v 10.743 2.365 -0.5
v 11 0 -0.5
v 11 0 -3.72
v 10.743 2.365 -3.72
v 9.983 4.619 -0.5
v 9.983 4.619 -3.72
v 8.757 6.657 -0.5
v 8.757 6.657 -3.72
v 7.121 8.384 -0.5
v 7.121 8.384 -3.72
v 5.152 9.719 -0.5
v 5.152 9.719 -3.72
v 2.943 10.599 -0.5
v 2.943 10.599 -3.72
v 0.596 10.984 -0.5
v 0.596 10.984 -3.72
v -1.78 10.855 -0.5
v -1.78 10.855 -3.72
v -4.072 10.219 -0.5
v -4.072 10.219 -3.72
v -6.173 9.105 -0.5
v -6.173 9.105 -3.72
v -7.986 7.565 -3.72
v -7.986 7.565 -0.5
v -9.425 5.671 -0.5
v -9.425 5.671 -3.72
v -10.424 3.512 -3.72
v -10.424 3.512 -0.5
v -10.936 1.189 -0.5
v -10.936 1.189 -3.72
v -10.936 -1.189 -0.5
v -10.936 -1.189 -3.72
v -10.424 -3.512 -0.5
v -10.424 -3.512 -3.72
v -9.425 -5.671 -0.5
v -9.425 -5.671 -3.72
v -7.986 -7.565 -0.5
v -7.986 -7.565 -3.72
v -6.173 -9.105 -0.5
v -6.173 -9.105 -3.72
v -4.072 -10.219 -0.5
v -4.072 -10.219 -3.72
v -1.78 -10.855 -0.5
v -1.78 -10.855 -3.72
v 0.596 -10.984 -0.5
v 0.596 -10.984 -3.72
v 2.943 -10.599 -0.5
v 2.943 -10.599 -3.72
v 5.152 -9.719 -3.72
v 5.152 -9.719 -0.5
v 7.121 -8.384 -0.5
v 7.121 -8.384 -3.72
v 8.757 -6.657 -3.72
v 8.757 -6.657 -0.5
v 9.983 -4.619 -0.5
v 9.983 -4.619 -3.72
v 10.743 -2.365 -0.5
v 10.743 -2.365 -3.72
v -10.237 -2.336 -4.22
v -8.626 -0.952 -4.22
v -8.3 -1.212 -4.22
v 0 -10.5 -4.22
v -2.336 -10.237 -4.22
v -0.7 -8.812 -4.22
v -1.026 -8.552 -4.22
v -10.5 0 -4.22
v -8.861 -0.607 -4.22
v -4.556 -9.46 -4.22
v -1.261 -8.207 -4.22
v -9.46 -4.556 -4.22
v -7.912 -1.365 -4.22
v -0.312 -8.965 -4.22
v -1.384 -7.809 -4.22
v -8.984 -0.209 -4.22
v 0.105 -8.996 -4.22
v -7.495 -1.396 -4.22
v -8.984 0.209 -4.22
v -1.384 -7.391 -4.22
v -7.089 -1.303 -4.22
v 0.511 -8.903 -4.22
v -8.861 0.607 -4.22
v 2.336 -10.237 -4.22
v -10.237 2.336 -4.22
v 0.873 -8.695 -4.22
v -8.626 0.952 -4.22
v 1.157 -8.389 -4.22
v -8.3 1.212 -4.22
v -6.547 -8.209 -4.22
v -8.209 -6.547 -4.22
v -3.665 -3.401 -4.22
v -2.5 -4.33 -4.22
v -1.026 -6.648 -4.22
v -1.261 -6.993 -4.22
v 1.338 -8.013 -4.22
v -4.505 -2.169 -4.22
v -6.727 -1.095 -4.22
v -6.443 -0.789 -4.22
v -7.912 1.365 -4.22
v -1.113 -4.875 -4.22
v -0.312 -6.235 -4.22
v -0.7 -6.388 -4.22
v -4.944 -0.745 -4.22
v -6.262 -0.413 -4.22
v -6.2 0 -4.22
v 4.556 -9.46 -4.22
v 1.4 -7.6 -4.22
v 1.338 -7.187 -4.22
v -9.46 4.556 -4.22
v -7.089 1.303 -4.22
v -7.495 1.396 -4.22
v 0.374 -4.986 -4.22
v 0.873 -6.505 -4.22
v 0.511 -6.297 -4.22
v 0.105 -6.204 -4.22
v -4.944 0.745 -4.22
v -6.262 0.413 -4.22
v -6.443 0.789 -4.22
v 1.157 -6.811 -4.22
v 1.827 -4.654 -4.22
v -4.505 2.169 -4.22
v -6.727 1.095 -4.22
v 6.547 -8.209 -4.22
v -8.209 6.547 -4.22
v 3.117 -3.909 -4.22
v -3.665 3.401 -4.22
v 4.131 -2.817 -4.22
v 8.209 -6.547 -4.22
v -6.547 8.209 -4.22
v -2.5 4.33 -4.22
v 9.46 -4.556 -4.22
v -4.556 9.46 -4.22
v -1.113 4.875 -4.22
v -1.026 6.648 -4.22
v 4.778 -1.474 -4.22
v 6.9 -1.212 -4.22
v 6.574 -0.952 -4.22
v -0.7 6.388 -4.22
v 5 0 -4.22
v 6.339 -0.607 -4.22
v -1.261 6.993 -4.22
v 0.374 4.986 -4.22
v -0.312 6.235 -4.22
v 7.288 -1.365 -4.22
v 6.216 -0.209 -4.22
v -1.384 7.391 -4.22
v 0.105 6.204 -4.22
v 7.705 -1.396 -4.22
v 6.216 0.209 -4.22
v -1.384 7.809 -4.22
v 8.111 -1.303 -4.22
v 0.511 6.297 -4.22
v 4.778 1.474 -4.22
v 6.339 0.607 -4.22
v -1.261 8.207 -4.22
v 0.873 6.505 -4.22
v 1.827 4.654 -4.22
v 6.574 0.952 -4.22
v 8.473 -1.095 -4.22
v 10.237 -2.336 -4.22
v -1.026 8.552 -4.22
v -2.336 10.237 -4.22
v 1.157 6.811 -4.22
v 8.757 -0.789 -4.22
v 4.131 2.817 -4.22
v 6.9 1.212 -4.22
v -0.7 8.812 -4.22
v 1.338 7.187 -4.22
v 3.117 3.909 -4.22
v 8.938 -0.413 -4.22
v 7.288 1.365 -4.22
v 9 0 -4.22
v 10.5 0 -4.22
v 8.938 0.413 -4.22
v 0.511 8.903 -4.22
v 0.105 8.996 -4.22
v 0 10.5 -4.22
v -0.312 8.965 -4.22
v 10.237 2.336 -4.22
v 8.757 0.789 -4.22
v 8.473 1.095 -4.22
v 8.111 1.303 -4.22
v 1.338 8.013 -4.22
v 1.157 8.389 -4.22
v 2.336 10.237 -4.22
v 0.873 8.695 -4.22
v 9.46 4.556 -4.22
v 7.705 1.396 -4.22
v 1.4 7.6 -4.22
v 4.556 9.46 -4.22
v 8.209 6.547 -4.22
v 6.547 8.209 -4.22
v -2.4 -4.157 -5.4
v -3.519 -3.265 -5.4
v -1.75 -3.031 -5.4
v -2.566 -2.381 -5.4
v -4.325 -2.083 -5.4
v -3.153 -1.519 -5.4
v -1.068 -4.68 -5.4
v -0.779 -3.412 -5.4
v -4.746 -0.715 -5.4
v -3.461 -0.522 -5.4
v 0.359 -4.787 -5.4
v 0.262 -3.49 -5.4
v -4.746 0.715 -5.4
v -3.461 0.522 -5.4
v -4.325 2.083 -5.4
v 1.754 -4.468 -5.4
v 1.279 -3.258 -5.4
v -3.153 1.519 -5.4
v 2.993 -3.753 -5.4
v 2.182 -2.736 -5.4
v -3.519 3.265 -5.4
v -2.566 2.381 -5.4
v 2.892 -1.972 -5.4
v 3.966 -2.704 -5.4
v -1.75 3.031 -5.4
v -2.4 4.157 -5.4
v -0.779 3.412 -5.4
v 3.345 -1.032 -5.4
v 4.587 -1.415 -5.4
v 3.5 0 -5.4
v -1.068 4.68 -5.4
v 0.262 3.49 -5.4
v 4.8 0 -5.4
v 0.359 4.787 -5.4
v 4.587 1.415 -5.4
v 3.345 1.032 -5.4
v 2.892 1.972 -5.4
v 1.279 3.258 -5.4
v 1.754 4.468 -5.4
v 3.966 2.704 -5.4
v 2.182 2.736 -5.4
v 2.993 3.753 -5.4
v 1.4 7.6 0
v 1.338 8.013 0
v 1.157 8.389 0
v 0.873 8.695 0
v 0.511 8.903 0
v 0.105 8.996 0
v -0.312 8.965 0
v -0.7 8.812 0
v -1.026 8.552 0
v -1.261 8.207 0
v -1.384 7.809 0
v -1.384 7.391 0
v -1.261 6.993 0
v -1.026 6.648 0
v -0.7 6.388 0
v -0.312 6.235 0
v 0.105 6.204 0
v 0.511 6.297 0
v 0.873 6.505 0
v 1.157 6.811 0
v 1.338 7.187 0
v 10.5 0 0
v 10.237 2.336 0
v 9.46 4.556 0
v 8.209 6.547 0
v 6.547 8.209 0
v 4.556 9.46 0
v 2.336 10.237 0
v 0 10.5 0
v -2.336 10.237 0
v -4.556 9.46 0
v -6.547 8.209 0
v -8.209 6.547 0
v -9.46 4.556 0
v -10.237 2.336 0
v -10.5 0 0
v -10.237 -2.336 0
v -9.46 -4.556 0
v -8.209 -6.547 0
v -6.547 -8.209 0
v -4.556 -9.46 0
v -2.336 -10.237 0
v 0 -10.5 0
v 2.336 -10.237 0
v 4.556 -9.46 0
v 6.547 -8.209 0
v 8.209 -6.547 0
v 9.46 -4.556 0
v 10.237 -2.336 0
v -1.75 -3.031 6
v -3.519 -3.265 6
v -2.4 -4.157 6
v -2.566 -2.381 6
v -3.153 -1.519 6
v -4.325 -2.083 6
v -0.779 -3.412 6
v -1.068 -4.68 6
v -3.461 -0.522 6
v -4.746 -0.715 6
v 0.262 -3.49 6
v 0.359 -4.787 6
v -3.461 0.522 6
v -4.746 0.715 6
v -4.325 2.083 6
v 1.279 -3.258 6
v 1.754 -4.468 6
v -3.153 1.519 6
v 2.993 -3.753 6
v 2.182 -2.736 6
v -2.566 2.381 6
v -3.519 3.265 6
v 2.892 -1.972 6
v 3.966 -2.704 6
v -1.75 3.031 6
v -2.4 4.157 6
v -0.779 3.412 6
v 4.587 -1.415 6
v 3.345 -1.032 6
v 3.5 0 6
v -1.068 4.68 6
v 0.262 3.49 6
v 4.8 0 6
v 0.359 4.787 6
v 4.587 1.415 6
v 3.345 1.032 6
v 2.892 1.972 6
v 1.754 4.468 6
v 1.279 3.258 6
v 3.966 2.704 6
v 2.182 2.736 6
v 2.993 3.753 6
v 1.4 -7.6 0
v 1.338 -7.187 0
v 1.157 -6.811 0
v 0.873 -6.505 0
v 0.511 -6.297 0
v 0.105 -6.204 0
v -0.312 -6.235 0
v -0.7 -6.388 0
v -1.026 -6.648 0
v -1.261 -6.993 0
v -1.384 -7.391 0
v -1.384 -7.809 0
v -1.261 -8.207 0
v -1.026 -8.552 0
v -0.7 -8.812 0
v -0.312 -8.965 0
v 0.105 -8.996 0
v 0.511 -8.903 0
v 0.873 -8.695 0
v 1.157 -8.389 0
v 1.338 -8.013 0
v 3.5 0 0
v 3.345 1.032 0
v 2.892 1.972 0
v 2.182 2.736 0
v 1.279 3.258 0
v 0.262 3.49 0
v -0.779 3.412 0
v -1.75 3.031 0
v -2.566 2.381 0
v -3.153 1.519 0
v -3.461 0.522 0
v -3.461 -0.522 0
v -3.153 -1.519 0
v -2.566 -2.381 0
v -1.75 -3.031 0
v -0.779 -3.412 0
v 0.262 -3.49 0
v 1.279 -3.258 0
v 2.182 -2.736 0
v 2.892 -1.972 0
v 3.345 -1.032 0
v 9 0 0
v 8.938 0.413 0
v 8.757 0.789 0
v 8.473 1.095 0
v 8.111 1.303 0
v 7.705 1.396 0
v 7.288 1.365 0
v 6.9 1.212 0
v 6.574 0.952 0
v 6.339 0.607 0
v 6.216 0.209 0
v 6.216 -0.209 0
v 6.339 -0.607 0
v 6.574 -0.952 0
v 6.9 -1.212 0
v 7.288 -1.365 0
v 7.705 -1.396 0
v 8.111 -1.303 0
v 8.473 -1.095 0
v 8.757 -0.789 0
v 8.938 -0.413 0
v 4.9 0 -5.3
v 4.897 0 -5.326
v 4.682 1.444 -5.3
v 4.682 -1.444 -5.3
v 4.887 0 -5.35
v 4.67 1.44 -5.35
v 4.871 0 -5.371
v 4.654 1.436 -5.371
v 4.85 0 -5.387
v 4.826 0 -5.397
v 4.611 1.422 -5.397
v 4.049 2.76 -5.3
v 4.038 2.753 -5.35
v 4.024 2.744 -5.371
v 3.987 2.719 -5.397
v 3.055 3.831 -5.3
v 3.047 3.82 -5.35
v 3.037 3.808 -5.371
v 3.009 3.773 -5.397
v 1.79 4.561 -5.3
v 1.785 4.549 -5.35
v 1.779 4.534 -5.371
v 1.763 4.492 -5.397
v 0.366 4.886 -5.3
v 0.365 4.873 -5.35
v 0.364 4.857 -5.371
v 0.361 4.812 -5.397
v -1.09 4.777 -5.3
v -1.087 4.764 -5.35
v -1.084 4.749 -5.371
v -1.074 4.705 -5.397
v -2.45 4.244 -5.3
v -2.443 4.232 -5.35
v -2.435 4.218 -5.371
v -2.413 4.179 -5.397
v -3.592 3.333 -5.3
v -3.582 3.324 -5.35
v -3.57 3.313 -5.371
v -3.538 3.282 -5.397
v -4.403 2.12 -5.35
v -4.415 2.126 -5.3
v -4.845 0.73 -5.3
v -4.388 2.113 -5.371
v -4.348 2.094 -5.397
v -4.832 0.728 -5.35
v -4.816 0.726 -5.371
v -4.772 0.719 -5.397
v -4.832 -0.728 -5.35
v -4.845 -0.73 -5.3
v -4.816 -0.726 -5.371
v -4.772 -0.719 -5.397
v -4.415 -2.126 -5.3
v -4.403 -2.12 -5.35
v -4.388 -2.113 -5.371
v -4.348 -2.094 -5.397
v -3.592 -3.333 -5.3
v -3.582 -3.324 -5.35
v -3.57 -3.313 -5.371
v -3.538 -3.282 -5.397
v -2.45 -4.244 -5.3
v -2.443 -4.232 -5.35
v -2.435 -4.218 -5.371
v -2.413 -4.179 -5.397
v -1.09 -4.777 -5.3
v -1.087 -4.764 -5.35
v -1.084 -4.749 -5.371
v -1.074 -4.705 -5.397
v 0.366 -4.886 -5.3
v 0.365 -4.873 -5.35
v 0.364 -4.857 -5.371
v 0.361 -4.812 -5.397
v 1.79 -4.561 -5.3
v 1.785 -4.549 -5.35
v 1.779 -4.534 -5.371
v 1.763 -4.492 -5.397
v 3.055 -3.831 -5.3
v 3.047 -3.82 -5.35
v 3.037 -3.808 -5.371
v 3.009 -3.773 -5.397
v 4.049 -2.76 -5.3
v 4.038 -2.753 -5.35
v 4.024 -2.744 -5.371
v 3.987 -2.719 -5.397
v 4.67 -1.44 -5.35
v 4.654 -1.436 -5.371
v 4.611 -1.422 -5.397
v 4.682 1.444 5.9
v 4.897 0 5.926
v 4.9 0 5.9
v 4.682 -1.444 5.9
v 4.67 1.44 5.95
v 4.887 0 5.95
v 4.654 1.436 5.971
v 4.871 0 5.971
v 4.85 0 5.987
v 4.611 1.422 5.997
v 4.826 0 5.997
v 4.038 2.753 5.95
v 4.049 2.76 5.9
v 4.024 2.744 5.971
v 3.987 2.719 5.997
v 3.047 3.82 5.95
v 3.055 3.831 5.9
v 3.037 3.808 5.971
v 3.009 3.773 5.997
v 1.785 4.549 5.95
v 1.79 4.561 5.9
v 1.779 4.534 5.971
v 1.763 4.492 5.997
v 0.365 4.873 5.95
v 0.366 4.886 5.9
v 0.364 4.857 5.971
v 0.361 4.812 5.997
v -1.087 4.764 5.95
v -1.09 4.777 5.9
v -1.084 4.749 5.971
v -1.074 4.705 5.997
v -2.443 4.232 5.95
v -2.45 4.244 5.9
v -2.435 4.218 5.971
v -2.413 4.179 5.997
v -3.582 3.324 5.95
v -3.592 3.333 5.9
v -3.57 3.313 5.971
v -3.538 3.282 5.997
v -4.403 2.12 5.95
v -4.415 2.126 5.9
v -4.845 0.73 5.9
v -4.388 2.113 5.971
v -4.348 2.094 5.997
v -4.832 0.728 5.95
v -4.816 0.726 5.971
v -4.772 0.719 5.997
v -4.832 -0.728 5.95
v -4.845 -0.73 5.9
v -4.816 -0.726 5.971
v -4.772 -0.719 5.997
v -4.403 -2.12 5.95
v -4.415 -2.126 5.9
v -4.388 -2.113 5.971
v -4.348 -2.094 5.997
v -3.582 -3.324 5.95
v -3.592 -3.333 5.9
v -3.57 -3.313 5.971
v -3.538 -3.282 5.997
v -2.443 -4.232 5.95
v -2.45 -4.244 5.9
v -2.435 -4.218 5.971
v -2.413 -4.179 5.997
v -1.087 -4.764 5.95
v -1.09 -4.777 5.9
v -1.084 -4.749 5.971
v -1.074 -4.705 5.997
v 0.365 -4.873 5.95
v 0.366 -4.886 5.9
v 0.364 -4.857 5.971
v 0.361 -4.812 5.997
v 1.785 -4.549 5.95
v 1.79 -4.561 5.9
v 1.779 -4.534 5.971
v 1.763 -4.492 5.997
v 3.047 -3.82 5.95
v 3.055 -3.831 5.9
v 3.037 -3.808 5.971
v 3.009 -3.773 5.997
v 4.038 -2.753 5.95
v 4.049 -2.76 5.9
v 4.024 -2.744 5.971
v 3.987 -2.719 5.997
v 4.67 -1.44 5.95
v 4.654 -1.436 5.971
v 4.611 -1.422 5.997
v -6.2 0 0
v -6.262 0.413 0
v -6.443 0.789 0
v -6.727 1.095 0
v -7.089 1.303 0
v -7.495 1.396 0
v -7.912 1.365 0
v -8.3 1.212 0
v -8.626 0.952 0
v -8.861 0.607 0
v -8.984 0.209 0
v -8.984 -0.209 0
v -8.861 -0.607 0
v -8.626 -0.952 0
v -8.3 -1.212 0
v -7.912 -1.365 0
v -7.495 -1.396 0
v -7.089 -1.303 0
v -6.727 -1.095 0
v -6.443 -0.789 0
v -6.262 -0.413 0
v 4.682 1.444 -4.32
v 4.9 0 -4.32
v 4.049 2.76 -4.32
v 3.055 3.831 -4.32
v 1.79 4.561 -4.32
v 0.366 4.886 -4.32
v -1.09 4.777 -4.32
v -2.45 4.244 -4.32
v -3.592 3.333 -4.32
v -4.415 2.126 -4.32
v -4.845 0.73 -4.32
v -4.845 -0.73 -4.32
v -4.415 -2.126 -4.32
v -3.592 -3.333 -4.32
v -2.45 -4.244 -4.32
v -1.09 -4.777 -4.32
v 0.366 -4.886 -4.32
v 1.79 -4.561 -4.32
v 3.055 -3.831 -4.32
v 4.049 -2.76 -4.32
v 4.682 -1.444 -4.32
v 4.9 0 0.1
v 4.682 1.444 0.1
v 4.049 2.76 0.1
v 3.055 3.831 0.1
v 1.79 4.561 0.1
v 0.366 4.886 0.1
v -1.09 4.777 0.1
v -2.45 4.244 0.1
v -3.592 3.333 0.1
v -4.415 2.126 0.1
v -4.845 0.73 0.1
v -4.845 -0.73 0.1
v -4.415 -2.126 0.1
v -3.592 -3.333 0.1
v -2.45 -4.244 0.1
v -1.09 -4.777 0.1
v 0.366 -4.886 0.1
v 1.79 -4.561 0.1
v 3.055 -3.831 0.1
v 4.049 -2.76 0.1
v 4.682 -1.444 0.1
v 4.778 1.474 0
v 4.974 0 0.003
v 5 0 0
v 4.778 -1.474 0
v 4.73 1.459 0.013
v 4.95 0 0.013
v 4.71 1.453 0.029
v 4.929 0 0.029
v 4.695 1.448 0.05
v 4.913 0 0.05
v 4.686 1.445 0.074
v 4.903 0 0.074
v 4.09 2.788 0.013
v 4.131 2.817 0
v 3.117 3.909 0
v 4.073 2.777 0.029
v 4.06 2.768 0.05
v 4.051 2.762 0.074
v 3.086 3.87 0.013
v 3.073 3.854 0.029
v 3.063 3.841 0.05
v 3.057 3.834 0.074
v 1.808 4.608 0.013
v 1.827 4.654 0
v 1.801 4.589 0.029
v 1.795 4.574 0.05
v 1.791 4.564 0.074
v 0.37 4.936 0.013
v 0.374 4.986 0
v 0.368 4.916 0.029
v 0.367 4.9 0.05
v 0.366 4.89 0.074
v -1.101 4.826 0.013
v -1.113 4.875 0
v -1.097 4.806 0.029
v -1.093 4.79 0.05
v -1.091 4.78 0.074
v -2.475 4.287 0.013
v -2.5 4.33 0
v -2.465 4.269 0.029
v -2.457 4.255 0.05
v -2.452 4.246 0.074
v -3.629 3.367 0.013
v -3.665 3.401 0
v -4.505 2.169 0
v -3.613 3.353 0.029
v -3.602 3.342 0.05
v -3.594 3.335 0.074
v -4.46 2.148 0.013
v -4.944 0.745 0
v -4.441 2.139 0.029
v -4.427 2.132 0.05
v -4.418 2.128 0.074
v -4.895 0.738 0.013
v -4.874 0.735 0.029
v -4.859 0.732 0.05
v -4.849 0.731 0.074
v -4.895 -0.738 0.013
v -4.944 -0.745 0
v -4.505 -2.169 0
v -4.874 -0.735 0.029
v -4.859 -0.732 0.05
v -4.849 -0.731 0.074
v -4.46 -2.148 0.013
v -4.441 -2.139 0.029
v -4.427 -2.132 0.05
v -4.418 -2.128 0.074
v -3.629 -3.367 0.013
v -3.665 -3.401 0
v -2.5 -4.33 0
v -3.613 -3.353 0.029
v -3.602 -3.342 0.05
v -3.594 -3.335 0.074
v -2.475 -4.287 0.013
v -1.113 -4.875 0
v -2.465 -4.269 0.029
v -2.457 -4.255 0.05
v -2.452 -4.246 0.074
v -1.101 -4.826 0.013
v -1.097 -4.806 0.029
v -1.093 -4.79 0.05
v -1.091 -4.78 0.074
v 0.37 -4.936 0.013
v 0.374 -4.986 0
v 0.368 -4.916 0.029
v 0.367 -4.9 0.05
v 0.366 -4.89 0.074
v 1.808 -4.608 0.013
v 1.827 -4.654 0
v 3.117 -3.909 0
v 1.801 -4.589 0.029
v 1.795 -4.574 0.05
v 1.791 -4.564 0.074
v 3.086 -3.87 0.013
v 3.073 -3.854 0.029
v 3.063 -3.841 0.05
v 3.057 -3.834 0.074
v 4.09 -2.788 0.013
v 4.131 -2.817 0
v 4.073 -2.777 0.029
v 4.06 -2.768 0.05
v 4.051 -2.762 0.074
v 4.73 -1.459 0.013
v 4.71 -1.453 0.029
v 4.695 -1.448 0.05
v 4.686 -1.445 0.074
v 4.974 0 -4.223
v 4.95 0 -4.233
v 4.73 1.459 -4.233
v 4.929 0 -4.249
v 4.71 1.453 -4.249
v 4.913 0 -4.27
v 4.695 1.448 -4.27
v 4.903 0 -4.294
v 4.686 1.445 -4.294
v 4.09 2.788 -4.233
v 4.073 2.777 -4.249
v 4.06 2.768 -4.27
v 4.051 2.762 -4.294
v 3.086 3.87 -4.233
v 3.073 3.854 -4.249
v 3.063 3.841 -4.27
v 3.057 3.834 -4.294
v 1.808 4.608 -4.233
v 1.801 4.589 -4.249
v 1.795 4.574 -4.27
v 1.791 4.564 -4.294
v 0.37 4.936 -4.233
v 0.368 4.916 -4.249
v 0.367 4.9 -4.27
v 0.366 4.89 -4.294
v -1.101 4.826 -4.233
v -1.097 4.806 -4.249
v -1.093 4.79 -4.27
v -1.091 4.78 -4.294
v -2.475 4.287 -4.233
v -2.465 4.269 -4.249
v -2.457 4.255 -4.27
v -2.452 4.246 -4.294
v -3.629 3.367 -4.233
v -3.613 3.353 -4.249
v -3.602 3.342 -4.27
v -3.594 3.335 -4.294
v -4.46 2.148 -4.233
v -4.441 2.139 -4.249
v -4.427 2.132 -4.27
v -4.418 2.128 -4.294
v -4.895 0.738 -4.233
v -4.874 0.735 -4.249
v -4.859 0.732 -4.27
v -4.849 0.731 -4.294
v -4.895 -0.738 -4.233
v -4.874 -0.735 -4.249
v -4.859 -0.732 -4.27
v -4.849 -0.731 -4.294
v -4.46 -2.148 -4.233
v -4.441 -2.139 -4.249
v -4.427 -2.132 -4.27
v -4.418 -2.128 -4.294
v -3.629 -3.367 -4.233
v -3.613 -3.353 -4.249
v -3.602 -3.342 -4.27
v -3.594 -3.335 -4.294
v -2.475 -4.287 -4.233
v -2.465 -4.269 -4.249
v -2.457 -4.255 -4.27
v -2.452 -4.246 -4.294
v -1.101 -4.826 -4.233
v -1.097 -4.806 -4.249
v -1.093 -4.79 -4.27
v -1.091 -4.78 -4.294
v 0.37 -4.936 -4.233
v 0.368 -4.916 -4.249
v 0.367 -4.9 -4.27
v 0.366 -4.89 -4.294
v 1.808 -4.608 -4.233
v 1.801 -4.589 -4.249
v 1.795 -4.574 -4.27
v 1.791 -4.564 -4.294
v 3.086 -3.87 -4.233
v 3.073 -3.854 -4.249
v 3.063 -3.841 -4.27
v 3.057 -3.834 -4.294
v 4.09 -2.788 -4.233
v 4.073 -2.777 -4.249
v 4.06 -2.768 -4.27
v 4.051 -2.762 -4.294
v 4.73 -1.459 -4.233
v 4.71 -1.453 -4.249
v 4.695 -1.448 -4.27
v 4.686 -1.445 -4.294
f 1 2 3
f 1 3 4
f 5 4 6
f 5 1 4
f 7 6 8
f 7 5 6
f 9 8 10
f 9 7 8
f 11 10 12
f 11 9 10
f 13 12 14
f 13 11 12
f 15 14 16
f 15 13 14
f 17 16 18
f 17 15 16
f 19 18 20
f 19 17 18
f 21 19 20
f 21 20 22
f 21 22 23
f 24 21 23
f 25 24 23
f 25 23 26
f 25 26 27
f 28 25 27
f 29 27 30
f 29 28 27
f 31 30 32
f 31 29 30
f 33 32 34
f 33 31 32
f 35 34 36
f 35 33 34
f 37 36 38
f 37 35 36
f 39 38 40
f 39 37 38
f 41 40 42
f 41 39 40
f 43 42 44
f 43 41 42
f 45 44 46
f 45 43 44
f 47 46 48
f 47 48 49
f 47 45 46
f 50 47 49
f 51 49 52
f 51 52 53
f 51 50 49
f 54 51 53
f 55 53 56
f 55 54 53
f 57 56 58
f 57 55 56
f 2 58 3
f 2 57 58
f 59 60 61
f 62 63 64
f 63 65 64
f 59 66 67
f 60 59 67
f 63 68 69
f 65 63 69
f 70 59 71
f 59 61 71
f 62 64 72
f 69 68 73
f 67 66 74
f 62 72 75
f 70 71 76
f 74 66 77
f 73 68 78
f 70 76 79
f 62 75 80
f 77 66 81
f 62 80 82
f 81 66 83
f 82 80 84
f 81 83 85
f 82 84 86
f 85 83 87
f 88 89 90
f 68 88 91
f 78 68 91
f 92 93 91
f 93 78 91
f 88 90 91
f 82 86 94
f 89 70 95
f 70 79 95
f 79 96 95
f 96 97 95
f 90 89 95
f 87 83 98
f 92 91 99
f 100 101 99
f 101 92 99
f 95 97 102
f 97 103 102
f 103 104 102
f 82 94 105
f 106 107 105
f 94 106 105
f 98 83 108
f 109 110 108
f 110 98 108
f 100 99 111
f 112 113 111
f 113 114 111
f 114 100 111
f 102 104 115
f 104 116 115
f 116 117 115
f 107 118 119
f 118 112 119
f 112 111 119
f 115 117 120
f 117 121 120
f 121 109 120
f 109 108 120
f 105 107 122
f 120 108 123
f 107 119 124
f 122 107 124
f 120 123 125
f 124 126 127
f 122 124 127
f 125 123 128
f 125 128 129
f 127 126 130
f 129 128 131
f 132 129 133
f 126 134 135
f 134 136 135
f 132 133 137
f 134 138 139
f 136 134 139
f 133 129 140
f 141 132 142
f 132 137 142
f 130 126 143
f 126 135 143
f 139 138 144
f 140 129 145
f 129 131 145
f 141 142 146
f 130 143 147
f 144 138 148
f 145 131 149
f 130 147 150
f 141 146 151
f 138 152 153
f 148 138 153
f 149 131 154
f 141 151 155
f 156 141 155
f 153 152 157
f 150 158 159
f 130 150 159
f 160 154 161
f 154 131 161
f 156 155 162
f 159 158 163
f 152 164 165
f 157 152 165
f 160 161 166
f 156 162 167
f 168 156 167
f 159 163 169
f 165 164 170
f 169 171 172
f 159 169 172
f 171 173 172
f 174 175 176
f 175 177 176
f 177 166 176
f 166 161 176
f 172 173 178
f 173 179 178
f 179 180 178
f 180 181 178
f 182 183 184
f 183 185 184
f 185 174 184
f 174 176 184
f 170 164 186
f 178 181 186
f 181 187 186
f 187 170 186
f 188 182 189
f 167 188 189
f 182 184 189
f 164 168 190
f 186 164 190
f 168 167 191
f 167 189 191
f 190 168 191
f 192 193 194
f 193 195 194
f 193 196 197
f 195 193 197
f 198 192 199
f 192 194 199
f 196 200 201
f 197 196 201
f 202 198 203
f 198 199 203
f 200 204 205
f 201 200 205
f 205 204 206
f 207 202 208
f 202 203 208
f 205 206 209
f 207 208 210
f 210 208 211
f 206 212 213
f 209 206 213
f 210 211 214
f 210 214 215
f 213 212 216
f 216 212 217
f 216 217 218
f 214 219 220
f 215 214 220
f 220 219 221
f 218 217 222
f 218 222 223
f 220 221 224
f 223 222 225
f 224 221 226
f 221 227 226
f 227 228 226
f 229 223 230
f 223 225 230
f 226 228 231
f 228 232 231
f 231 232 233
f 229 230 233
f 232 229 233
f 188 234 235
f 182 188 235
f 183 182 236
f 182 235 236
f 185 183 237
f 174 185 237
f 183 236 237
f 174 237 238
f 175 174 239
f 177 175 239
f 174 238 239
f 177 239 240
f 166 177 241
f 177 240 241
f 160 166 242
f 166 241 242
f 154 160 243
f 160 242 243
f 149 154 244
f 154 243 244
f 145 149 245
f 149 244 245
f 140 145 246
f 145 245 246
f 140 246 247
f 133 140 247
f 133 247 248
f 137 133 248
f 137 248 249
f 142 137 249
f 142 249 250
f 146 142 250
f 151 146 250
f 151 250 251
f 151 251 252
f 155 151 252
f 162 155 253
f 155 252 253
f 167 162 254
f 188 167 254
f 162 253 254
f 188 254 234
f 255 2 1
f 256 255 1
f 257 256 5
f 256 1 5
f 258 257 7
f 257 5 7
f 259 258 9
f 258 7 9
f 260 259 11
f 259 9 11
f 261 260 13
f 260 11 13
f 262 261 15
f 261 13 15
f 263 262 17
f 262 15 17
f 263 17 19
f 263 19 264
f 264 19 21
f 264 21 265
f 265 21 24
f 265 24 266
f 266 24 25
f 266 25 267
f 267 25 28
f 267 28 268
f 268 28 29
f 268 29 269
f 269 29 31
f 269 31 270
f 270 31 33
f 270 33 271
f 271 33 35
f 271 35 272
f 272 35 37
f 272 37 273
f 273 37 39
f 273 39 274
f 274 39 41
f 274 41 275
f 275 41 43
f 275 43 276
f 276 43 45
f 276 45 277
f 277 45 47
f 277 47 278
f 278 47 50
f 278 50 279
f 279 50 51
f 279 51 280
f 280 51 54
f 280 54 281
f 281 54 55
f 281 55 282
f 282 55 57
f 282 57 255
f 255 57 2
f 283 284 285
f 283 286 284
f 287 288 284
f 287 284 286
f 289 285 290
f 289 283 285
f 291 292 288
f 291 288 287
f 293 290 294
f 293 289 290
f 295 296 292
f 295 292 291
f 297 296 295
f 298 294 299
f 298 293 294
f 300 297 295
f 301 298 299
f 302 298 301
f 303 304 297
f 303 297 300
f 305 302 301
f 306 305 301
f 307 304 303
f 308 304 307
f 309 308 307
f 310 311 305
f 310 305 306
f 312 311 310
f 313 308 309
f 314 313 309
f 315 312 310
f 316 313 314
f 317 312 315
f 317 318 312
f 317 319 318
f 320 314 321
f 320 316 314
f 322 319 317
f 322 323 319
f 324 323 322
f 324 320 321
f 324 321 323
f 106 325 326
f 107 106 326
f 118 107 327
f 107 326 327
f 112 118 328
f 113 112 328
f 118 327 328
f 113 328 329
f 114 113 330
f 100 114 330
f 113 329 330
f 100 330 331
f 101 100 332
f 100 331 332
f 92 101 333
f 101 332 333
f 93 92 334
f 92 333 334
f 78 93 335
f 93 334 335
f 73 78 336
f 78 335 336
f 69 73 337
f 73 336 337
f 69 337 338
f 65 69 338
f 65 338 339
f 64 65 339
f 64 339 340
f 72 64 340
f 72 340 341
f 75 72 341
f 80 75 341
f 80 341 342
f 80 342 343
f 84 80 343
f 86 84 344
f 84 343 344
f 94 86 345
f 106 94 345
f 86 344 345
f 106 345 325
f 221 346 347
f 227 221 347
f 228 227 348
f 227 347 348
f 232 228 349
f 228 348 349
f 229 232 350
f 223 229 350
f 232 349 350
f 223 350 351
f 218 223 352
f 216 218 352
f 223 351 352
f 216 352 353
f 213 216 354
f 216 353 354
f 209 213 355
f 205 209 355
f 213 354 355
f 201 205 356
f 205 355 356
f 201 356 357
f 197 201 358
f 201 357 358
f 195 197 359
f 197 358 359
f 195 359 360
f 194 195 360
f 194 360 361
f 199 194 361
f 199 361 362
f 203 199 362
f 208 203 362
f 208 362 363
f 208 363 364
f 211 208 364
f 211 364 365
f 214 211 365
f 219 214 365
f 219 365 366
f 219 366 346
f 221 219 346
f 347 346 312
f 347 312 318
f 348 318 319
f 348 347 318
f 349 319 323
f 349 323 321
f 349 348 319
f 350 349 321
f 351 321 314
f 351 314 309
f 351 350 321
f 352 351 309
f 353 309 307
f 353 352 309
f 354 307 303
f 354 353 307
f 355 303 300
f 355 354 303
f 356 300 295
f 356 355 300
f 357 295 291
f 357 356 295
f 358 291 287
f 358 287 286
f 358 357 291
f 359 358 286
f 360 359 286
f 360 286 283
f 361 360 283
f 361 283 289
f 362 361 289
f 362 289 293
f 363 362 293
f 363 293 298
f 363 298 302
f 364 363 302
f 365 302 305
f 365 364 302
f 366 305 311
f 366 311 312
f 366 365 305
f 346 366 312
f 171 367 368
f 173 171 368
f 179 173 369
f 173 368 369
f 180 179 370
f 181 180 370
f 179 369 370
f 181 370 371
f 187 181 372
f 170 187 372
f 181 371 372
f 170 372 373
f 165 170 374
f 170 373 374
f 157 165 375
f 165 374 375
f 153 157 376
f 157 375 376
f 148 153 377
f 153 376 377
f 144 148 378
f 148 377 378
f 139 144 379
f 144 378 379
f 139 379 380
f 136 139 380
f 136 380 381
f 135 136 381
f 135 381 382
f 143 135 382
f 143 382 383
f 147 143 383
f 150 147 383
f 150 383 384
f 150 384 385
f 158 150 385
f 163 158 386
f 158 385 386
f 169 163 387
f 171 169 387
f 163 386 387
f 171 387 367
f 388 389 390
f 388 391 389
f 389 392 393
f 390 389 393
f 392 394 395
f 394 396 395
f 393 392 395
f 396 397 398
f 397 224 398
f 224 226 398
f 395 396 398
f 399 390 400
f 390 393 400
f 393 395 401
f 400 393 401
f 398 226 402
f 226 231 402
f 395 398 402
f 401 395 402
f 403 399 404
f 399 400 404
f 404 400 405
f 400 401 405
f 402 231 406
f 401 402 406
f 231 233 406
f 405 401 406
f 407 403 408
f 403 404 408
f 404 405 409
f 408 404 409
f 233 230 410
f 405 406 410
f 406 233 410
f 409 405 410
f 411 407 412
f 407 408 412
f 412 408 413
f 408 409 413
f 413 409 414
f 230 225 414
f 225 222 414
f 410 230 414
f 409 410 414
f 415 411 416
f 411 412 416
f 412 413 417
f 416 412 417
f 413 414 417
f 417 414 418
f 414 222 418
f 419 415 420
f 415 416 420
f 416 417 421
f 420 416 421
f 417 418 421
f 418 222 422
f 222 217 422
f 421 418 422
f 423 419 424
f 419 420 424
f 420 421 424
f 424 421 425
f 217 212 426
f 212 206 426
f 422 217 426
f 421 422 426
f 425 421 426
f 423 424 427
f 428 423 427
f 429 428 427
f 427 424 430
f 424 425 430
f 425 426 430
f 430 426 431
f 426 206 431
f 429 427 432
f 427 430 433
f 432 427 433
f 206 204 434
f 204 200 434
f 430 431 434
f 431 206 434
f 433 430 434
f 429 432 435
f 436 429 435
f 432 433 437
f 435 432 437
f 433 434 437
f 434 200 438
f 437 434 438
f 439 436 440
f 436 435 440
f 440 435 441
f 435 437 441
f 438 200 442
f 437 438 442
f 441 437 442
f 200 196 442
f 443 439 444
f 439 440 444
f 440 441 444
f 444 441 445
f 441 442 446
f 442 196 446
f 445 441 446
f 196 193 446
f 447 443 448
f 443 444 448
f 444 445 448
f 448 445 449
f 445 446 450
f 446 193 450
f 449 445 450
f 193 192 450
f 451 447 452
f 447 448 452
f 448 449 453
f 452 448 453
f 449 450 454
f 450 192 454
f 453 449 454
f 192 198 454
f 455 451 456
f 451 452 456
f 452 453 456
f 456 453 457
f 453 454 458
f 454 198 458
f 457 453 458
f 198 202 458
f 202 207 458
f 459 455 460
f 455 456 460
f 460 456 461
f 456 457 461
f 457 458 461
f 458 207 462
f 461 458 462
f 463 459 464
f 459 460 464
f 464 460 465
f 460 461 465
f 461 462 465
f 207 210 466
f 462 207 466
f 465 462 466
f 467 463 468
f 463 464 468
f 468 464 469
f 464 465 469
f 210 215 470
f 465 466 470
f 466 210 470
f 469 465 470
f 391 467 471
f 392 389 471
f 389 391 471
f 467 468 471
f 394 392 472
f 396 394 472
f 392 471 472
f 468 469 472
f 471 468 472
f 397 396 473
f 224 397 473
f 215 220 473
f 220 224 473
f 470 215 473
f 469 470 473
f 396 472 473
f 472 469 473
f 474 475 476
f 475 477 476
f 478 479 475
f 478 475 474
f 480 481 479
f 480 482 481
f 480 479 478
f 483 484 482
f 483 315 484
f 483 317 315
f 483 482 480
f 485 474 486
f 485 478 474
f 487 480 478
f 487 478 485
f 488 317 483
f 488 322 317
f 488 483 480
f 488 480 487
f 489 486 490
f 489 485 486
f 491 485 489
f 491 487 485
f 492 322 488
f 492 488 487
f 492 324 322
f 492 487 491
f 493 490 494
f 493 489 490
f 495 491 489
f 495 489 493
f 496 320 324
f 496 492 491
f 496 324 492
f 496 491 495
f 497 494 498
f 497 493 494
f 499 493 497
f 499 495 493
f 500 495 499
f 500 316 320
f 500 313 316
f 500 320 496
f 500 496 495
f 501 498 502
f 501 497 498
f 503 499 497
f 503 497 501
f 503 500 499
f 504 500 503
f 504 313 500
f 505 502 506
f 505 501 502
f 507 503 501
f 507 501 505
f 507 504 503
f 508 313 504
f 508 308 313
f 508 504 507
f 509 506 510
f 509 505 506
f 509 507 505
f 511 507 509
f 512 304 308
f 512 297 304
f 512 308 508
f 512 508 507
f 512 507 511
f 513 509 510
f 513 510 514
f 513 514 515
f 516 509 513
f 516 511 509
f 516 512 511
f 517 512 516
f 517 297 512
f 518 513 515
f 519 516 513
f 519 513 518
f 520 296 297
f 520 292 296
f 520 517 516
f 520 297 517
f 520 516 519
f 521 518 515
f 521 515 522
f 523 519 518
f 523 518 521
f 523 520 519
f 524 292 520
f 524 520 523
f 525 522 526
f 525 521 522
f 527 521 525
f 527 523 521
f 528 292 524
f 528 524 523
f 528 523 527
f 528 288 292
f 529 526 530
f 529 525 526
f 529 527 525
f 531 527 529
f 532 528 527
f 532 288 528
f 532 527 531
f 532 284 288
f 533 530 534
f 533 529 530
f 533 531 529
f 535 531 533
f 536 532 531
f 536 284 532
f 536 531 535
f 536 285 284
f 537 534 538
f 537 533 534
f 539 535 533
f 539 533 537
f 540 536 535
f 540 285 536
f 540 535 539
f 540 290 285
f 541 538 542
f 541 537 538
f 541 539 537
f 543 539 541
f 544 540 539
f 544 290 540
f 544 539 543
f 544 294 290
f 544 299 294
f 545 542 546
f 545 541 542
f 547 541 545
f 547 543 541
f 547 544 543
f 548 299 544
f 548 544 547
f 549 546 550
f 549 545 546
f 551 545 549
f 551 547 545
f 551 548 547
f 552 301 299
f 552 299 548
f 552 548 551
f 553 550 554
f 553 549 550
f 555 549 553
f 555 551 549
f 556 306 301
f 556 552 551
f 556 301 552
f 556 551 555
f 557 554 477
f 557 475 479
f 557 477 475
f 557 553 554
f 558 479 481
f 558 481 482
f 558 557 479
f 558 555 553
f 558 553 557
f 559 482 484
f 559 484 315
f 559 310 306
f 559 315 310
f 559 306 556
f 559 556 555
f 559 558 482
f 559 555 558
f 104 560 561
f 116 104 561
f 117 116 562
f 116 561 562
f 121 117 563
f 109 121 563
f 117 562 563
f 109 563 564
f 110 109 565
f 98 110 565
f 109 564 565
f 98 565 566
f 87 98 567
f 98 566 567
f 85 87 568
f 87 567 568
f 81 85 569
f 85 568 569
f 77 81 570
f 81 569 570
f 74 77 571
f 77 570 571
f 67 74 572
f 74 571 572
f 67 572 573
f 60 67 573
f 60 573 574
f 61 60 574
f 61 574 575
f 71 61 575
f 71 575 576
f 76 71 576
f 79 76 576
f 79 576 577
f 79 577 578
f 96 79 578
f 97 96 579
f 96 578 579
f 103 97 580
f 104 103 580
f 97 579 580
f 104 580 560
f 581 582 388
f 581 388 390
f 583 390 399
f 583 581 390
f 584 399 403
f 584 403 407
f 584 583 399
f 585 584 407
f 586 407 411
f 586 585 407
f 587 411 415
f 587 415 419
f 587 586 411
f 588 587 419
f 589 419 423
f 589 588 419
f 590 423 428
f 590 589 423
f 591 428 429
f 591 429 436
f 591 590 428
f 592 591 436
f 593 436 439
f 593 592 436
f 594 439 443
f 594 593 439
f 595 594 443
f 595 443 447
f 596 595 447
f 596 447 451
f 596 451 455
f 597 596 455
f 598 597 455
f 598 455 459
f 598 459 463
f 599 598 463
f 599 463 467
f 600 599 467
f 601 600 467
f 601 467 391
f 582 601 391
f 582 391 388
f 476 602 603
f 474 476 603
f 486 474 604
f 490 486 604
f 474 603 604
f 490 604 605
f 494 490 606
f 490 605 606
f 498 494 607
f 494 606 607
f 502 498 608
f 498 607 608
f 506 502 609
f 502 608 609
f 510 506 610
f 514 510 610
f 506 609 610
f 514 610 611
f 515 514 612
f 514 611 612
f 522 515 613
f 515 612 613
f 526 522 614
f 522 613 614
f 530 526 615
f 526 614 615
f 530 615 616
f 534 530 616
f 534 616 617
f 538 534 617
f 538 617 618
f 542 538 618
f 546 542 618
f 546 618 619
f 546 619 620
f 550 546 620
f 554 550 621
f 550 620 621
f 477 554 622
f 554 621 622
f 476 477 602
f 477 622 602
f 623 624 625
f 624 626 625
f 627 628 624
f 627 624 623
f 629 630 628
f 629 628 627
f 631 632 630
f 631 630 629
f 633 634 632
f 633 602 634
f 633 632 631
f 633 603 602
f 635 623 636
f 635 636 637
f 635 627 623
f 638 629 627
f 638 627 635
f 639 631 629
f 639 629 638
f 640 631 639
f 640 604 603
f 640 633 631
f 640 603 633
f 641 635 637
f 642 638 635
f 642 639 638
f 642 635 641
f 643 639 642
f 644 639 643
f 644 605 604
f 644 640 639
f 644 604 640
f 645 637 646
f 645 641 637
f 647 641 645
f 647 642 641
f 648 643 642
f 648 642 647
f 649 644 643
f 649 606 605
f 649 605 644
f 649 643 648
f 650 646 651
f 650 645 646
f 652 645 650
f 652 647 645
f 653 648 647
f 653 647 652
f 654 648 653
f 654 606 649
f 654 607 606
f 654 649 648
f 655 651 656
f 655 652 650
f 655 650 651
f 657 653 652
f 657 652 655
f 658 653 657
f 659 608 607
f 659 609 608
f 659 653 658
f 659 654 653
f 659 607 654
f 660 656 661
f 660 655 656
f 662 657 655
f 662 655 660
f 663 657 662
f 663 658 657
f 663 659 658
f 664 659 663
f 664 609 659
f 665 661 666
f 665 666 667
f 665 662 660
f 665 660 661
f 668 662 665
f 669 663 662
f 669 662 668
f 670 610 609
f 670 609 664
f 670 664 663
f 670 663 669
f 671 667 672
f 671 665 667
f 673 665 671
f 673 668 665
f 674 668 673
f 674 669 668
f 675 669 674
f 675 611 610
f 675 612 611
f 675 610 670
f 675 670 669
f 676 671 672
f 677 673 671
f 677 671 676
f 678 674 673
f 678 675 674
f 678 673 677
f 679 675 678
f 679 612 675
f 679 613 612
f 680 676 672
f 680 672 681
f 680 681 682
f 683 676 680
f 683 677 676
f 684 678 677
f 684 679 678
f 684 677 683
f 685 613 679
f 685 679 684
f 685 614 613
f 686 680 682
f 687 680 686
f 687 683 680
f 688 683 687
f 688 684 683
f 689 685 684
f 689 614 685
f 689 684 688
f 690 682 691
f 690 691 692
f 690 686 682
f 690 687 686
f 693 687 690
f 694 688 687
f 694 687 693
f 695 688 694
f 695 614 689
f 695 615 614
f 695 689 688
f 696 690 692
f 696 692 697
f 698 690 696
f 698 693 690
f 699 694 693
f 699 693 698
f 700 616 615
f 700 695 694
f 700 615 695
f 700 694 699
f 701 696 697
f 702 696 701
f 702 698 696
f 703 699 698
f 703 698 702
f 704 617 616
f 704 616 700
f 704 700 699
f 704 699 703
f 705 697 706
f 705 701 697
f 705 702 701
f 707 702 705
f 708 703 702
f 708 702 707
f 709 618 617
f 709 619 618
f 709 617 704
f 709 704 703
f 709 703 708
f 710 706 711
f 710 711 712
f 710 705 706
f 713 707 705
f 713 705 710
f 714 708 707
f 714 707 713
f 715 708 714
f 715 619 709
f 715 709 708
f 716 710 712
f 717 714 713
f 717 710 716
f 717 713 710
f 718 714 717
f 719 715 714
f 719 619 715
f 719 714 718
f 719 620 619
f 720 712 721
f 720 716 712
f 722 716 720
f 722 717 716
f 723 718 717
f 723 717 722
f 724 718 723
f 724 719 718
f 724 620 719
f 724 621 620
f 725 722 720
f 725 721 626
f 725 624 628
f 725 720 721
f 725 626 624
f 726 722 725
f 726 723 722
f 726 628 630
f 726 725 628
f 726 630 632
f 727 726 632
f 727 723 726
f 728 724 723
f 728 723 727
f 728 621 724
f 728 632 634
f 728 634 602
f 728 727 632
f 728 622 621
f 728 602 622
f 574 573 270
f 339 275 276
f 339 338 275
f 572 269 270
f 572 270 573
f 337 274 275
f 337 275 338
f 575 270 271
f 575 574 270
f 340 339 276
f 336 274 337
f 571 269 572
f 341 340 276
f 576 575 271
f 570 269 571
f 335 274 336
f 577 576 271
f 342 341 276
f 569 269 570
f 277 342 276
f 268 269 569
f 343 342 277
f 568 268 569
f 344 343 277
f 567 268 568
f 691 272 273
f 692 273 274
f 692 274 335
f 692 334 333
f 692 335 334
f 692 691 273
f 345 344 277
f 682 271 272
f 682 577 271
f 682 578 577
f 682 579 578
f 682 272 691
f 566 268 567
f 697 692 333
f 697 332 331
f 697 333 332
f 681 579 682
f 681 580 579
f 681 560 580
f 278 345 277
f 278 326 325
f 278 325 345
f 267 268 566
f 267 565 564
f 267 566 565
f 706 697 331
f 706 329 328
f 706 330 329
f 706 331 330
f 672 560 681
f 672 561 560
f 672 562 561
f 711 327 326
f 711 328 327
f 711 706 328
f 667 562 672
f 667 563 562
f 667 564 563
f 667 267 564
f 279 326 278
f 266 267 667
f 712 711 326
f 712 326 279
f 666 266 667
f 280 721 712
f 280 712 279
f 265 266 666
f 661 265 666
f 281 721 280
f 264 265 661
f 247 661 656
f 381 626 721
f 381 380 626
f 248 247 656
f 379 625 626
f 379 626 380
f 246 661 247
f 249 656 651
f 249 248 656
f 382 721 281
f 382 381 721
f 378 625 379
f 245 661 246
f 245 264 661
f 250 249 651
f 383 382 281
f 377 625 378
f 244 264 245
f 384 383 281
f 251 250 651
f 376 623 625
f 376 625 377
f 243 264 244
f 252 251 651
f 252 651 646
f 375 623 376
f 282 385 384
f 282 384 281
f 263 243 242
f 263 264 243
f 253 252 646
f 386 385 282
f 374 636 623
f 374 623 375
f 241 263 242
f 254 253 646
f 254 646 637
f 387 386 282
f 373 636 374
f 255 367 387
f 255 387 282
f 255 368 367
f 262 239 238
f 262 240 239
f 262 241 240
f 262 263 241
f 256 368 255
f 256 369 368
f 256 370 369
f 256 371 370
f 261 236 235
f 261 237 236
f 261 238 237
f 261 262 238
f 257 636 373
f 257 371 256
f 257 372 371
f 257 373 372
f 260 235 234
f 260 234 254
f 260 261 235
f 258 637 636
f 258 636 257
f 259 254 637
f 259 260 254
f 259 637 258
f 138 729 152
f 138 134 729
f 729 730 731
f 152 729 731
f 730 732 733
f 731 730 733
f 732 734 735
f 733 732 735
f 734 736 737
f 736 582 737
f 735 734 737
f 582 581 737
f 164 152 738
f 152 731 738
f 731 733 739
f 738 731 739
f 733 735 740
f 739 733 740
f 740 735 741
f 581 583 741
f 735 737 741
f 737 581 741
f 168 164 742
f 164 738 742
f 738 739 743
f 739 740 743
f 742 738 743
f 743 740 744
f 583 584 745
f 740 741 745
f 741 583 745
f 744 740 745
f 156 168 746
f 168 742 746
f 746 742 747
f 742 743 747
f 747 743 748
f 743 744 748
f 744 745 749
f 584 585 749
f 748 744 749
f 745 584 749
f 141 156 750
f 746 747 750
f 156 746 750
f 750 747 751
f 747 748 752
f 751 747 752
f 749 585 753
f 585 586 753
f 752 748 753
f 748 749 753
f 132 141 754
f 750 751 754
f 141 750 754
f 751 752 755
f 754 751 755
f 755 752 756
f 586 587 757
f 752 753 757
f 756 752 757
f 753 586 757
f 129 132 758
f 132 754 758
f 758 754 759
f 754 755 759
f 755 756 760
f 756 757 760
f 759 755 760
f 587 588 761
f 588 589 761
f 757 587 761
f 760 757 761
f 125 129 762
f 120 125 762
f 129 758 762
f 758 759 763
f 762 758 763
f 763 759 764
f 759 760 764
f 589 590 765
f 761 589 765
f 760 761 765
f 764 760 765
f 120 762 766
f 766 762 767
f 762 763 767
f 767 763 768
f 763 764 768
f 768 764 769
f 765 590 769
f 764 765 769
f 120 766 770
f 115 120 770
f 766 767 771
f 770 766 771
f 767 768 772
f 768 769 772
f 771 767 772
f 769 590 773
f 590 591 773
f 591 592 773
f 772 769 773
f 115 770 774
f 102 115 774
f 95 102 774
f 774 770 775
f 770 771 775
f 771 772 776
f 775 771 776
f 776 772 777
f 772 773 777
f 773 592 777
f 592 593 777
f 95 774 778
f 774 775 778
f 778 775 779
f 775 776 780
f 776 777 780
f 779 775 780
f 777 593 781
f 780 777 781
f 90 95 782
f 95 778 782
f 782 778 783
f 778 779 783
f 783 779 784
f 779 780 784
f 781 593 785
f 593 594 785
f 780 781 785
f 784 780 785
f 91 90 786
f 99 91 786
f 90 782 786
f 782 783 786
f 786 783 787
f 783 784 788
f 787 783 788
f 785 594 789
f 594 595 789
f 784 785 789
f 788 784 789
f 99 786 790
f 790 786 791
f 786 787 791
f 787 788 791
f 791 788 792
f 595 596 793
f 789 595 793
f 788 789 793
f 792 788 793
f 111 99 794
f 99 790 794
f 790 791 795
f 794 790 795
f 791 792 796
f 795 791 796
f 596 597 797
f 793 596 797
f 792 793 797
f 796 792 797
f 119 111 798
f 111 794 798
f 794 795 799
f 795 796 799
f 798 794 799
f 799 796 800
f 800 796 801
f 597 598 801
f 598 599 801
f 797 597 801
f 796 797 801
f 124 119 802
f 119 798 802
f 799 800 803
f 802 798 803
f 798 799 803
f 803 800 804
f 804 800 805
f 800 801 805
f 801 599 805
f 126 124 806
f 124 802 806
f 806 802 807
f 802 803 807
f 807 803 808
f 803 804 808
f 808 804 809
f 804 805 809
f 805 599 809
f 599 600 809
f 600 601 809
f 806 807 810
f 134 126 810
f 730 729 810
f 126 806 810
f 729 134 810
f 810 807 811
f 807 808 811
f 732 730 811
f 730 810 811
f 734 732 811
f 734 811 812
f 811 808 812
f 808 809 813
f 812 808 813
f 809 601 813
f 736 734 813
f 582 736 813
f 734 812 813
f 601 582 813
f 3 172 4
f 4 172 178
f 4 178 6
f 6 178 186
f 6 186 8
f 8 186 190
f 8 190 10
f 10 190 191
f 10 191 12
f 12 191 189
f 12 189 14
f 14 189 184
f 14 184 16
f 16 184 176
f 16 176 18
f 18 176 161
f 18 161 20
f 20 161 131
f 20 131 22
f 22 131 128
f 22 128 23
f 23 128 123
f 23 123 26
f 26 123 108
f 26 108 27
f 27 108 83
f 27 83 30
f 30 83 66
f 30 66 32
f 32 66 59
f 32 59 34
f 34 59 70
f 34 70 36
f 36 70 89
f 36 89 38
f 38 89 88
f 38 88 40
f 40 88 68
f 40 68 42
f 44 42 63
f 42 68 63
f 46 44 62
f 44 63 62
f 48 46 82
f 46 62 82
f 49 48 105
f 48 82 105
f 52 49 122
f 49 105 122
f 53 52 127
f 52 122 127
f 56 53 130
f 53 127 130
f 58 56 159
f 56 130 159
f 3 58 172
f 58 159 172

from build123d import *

# Parameters (mm, degrees)
F0_R          = 11
F0_R_2        = 1.4
F0_R_3        = 4.9
F0_R_4        = 3.5
F1_DEPTH      = 4.22
F2_DEPTH      = 5.4
F2_DEPTH_BACK = 6
F3_SIZE       = 0.5
F4_R          = 0.1


with BuildPart() as f1:
    # F0 (on Top) → F1 (new body)
    with BuildSketch(Plane.XY):
        Circle(F0_R)
        with Locations((0, -7.6)):
            Circle(F0_R_2, mode=Mode.SUBTRACT)
        with Locations((-7.6, 0)):
            Circle(F0_R_2, mode=Mode.SUBTRACT)
        Circle(F0_R_3, mode=Mode.SUBTRACT)
        with Locations((7.6, 0)):
            Circle(F0_R_2, mode=Mode.SUBTRACT)
        with Locations((0, 7.6)):
            Circle(F0_R_2, mode=Mode.SUBTRACT)
        Circle(F0_R_3)
        Circle(F0_R_4, mode=Mode.SUBTRACT)
    extrude(amount=-F1_DEPTH)

    # F0 (on Top) → F2 (join, two sides)
    with BuildSketch(Plane.XY) as f2_sk:
        Circle(F0_R_3)
        Circle(F0_R_4, mode=Mode.SUBTRACT)
    extrude(amount=-F2_DEPTH)
    extrude(f2_sk.sketch, amount=F2_DEPTH_BACK)

    # F3
    f3_edges = [f1.edges().sort_by_distance(p)[0] for p in [
        (-11, 0, 0),
        (-11, 0, -4.22),
    ]]
    chamfer(f3_edges, length=F3_SIZE)

    # F4
    f4_edges = [f1.edges().sort_by_distance(p)[0] for p in [
        (-4.9, 0, 0),
        (-4.9, 0, 6),
        (-4.9, 0, -4.22),
        (-4.9, 0, -5.4),
    ]]
    fillet(f4_edges, radius=F4_R)


solid = f1.part
